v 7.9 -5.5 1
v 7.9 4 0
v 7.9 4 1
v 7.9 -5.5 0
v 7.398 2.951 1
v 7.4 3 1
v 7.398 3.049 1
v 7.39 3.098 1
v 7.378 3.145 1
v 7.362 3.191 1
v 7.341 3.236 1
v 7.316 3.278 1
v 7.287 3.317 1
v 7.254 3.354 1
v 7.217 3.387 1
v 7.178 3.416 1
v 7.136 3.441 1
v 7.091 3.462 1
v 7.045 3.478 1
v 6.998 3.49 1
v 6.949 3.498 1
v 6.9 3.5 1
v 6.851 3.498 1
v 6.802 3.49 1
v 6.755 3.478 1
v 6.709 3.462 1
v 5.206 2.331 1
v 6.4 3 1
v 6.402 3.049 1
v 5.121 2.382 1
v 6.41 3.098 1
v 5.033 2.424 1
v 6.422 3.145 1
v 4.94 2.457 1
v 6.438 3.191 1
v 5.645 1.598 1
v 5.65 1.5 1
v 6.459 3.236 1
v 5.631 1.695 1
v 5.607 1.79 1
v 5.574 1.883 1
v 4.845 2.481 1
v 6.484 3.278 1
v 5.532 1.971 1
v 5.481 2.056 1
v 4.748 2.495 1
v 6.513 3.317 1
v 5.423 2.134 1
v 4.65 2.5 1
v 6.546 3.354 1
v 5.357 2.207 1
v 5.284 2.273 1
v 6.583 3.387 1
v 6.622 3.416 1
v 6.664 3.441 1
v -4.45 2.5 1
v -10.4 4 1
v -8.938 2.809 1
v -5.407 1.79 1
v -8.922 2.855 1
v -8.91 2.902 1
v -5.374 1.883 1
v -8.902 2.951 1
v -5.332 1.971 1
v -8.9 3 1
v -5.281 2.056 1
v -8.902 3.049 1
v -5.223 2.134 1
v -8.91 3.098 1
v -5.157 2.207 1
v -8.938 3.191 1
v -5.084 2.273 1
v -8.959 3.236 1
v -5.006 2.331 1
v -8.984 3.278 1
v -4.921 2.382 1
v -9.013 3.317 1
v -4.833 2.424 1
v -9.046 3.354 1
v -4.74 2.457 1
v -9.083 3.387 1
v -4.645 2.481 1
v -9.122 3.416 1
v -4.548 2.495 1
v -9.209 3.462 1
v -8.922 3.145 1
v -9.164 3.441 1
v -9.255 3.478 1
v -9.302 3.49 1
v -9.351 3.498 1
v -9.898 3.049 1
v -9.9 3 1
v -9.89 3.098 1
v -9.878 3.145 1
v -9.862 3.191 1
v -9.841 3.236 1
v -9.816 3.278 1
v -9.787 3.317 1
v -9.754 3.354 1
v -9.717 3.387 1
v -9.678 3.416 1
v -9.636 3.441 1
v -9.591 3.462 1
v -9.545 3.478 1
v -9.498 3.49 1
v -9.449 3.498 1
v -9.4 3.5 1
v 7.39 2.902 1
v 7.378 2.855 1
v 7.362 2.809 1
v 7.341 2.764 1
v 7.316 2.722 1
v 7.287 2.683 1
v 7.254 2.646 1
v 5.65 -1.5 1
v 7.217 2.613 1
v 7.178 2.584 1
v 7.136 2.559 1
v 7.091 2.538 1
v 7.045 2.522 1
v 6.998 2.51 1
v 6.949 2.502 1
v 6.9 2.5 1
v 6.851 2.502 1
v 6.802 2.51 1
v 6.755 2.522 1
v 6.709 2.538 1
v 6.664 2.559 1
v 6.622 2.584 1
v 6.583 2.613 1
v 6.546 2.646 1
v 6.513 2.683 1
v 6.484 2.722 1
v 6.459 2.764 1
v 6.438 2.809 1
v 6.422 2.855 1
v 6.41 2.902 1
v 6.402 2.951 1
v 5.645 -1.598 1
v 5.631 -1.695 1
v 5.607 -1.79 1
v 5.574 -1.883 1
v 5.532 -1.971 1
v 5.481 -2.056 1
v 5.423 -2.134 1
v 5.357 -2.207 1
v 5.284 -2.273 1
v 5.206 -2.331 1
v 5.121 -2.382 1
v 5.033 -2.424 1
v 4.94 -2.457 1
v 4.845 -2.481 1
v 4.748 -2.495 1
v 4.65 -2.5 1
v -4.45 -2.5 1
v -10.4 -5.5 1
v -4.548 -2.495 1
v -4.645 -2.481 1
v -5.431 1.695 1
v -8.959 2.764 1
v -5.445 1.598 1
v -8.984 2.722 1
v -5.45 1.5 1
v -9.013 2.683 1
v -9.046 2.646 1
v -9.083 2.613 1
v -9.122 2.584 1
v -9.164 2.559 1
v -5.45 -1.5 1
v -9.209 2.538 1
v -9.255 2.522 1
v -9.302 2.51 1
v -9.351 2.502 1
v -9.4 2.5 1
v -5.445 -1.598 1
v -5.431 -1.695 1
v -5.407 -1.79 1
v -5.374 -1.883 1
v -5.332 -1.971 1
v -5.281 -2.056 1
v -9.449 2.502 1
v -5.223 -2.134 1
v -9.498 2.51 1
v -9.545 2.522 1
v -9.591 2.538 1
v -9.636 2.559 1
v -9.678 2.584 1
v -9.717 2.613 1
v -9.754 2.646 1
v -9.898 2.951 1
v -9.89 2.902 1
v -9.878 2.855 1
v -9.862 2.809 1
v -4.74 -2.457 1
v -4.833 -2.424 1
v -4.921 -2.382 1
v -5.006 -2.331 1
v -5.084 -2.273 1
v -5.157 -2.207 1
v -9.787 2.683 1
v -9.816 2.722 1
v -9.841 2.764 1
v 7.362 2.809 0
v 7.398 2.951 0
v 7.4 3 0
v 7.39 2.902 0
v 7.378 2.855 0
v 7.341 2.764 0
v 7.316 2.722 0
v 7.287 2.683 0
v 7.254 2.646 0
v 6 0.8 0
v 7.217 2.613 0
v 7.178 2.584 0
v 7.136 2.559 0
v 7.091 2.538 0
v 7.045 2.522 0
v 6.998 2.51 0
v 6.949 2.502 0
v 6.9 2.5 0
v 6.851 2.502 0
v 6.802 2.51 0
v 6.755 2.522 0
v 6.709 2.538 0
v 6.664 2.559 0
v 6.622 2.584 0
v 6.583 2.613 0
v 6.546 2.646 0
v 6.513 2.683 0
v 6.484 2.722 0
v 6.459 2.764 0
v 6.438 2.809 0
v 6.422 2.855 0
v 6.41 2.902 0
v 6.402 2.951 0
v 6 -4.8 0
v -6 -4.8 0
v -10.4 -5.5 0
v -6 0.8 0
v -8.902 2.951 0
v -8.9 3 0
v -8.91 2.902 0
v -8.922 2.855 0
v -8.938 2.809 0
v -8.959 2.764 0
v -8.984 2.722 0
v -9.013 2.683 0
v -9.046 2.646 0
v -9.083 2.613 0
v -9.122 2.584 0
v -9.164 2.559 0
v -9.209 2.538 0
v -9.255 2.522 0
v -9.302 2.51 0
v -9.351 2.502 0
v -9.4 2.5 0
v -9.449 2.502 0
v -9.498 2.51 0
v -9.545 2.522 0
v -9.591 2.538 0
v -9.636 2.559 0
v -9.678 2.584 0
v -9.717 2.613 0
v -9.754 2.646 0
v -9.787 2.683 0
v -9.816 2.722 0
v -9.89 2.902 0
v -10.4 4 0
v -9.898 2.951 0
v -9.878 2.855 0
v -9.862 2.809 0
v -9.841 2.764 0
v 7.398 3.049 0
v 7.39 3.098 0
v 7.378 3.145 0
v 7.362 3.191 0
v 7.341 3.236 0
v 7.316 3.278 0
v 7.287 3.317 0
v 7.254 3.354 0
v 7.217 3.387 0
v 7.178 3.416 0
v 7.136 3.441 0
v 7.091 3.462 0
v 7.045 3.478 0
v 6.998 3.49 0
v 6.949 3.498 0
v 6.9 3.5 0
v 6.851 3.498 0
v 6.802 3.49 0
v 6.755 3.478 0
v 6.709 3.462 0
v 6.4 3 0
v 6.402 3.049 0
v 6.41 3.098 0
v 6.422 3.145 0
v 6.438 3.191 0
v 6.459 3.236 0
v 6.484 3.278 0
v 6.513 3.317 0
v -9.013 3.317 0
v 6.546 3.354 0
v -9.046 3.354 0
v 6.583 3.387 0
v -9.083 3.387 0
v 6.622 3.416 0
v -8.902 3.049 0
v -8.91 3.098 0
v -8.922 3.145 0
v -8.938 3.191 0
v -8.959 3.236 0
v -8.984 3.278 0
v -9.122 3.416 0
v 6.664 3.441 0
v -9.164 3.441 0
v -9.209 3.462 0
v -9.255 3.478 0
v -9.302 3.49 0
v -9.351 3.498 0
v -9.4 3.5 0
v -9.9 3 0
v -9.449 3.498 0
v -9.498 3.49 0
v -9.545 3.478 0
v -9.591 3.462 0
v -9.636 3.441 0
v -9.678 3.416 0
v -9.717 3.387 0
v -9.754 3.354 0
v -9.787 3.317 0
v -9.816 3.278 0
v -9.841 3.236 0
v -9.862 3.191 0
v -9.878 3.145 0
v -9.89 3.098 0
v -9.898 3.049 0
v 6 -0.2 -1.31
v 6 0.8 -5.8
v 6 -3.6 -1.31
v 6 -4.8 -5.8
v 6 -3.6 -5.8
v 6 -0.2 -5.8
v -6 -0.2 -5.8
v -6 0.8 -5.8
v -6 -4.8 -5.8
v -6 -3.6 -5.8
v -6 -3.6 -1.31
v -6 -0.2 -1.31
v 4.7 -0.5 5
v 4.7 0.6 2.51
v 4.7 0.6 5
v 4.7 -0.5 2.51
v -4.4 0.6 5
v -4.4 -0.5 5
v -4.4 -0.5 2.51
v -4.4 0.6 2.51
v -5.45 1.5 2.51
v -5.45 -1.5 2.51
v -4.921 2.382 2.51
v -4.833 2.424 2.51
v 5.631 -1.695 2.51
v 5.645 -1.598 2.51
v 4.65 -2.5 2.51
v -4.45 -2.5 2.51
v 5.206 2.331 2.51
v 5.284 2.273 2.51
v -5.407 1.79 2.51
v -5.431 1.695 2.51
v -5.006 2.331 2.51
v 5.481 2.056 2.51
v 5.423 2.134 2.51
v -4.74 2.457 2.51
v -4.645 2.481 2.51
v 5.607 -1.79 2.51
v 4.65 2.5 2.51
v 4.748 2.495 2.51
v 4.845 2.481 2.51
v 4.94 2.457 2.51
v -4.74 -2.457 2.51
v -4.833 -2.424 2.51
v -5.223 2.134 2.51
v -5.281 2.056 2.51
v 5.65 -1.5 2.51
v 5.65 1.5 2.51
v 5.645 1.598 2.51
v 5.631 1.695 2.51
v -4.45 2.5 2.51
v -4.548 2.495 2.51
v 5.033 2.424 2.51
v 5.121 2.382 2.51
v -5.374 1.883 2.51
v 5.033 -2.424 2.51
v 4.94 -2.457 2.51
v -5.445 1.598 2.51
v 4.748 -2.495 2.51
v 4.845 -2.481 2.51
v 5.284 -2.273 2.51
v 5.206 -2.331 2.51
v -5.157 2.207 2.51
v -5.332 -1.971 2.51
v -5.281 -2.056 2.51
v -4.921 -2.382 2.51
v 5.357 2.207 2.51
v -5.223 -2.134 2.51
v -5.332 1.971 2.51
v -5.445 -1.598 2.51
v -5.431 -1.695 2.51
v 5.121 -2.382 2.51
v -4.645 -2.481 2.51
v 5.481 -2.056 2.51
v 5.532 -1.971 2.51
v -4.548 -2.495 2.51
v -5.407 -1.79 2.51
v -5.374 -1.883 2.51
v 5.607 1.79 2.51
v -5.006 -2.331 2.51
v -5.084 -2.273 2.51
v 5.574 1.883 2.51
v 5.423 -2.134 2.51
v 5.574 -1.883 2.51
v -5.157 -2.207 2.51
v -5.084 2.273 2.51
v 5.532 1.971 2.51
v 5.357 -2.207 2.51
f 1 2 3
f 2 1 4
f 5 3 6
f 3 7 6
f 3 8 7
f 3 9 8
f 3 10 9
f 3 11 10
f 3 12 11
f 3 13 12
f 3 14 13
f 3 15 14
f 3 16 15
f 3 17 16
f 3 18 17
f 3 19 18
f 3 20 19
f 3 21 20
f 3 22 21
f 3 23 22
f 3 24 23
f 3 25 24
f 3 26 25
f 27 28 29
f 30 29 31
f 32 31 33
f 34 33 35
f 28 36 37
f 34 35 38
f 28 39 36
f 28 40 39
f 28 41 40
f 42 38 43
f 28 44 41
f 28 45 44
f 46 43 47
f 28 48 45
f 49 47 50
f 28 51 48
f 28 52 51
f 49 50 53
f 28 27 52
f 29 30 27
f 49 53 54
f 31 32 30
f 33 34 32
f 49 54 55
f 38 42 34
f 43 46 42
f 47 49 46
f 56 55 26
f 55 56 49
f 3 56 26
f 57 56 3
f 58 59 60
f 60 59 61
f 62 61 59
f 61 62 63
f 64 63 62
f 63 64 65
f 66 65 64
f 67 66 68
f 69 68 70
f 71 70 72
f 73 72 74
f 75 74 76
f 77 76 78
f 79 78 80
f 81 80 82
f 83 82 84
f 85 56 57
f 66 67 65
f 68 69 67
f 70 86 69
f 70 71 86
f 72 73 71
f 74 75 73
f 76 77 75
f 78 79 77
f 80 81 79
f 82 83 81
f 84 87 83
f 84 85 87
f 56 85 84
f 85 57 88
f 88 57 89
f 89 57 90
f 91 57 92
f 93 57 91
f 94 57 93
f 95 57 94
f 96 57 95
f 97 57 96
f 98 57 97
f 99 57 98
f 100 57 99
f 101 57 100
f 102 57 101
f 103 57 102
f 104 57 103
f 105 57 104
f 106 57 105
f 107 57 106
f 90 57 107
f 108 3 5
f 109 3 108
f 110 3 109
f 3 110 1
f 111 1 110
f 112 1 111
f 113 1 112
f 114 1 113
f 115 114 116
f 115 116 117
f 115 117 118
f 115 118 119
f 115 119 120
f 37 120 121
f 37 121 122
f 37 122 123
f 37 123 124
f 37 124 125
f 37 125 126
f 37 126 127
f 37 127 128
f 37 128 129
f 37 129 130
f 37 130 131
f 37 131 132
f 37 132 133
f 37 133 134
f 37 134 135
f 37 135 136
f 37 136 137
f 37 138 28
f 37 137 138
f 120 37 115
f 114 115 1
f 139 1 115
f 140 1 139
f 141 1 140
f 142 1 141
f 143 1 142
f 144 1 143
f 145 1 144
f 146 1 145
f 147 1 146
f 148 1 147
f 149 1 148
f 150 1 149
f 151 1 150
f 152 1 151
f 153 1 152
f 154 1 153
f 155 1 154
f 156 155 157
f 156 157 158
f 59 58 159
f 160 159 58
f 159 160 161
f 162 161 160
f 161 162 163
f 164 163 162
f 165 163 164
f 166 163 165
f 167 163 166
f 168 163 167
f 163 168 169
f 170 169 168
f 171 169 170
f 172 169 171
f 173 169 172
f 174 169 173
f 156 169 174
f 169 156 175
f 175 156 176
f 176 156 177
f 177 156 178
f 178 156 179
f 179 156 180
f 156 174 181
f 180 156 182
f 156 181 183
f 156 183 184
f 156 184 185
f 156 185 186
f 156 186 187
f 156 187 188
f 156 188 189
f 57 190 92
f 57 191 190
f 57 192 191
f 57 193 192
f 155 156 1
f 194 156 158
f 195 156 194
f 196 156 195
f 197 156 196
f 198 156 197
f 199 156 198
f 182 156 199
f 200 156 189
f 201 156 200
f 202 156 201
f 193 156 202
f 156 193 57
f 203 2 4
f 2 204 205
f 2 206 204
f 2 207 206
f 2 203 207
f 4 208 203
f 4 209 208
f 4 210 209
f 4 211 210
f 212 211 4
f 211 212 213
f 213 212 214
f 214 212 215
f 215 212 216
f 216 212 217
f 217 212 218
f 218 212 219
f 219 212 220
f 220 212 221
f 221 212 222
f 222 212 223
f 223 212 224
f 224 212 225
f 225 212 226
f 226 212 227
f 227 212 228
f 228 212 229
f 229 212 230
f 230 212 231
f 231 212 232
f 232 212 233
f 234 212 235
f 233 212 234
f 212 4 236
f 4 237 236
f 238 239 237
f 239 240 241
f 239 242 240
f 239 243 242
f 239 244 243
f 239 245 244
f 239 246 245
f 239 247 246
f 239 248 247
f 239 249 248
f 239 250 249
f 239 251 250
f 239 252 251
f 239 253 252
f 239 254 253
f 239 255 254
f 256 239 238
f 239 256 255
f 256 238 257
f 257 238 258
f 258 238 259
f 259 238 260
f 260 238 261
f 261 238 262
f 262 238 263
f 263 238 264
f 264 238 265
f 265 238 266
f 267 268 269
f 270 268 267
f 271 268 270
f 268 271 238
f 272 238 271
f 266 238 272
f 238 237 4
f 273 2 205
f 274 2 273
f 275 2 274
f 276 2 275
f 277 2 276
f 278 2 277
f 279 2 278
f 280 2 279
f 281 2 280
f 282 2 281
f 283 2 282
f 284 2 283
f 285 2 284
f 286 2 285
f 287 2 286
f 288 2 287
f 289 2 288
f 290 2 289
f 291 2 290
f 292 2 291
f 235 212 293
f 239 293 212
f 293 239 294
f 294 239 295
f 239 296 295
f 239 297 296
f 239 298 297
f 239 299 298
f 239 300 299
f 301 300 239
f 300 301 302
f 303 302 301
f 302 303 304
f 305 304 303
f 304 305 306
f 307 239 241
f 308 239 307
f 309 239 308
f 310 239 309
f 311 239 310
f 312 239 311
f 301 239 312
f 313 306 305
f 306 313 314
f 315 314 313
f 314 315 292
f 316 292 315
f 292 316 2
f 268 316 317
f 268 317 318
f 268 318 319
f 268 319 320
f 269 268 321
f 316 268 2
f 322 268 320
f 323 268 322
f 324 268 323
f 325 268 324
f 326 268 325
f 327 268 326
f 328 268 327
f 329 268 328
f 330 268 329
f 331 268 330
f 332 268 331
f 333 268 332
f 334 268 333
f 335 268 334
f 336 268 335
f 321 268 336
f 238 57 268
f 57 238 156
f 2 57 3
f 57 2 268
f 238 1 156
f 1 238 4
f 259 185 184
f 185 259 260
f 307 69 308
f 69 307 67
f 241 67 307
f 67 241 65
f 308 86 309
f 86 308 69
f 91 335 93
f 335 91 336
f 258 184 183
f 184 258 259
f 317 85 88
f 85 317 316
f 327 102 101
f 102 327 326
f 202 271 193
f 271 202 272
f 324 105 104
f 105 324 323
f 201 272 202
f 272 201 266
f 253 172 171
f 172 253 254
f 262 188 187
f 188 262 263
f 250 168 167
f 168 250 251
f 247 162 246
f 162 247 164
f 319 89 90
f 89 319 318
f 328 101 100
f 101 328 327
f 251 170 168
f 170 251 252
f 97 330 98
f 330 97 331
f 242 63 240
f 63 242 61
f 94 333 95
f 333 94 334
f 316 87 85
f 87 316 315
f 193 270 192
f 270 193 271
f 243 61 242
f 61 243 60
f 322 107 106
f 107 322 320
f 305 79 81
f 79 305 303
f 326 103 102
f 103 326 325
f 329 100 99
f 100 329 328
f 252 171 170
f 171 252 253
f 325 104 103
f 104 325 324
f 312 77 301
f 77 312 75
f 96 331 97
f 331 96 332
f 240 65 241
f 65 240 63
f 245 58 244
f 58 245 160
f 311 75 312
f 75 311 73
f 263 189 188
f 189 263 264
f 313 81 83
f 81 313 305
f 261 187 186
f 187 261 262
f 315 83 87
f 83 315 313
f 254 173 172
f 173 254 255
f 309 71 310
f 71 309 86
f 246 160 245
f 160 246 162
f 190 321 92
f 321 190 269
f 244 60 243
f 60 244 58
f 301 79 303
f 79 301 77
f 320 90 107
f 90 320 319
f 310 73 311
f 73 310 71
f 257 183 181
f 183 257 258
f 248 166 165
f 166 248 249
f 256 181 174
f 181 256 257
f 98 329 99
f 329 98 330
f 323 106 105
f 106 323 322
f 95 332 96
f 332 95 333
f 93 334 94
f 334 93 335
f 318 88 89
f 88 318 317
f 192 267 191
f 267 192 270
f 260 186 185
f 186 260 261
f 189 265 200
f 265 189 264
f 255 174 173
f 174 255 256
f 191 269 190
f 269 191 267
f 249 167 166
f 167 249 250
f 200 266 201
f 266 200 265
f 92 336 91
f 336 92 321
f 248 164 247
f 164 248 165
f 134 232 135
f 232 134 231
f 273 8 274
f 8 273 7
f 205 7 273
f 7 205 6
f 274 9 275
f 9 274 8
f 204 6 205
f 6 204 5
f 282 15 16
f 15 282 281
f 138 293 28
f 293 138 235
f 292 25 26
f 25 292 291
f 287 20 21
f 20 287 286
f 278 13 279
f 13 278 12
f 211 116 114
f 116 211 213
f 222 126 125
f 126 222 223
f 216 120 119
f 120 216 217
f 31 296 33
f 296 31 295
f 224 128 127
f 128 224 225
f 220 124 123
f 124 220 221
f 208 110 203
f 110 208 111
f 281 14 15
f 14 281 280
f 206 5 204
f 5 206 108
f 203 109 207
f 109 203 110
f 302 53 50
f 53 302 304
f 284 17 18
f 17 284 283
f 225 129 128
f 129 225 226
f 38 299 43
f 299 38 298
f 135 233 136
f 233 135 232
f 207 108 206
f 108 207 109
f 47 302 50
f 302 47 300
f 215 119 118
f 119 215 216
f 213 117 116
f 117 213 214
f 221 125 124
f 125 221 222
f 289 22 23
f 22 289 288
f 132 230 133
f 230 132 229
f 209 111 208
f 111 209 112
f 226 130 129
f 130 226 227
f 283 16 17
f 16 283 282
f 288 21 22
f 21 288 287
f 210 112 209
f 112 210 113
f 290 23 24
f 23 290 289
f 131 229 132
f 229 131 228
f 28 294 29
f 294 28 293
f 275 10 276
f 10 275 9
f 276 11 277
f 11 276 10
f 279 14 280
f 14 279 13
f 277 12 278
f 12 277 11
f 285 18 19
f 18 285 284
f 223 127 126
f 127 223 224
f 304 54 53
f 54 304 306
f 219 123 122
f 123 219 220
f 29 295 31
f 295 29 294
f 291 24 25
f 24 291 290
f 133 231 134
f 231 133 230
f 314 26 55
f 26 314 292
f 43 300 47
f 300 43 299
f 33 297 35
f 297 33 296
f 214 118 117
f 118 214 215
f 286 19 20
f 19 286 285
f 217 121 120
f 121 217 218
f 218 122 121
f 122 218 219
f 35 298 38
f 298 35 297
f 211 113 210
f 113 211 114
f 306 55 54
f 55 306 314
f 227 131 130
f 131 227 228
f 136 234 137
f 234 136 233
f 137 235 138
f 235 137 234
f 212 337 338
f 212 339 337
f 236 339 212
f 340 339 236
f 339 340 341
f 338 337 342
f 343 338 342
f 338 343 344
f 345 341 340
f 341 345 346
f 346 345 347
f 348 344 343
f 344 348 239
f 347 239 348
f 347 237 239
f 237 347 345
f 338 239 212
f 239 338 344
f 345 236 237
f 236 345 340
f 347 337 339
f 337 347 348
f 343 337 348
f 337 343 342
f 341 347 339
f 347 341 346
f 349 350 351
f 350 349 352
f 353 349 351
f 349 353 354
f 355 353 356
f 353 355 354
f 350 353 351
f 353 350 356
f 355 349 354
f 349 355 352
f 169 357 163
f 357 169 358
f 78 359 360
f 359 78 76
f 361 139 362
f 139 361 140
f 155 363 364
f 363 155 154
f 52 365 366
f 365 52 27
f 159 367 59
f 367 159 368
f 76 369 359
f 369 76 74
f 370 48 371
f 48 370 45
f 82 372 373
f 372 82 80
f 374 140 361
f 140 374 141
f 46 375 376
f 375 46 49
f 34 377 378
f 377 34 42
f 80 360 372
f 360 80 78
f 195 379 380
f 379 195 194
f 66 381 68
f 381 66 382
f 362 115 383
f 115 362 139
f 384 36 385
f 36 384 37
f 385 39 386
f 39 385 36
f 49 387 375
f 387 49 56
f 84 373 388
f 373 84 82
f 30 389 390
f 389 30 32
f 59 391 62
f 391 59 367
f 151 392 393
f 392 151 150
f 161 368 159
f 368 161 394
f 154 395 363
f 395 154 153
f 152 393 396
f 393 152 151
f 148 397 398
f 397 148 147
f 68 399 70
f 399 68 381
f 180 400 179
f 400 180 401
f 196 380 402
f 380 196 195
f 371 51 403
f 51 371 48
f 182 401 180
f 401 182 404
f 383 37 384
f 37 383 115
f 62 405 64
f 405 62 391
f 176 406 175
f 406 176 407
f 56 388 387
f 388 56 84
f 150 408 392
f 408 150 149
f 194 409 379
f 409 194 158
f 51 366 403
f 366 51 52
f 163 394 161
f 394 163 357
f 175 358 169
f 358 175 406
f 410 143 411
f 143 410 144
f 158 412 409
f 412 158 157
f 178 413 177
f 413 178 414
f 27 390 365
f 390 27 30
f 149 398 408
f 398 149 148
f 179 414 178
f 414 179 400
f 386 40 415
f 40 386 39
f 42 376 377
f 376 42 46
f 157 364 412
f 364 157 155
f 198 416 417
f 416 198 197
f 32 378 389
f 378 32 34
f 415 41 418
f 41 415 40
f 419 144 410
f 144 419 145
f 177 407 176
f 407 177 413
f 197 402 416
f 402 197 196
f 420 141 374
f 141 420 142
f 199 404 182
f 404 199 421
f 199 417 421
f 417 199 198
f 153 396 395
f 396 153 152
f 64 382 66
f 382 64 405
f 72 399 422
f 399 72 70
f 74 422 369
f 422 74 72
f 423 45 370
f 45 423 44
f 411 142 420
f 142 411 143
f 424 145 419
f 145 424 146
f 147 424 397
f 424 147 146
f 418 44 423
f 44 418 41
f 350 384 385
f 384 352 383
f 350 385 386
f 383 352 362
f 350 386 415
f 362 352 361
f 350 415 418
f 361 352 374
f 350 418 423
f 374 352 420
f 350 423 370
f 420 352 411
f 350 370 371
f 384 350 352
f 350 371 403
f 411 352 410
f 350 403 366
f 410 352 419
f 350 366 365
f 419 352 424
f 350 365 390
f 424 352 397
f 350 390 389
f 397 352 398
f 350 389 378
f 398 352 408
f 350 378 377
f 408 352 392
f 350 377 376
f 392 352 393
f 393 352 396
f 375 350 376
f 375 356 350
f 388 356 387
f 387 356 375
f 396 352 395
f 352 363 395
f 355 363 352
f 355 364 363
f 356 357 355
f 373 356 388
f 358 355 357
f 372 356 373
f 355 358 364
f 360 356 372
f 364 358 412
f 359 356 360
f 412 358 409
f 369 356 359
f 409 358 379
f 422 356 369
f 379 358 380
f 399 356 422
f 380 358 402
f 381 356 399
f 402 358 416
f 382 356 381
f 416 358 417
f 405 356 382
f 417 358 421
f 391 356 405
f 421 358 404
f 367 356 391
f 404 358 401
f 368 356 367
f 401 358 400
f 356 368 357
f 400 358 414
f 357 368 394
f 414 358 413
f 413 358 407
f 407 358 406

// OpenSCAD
// file: roundedrect.scad
$fn=64;


// size - [x,y,z]
// radius - radius of corners
// DEPRECATED!!
module roundedRect(size, radius, center=false)
{
    x = size[0];
    y = size[1];
    z = size[2];
    translate([0,0,z/2])
    _cube_vertex_smooth2d([x,y,z],radius);
}


// size - [x,y,z]
// radius - radius of corners
module _cube_vertex_smooth3d(size,radius=1)
{
    minkowski() {
        cube([size[0]-radius*2,
              size[1]-radius*2,
              size[2]-radius*2],
             center=true);
        sphere(r=radius);
    }
}

module cube_vertex_smooth3d(size,radius=1,center=false)
{
    if (center) {
        _cube_vertex_smooth3d(size,radius);
    } else {
        translate([size[0]/2,size[1]/2,size[2]/2])
        _cube_vertex_smooth3d(size,radius);
    }
}

module _cube_vertex_smooth2d(size,radius=1)
{
    minkowski() {
        cube([size[0]-radius*2,
              size[1]-radius*2,
              size[2]],
             center=true);
        cylinder(h=0.01,r=radius);
    }
}

// size - [x,y,z]
// radius - radius of corners
module cube_vertex_smooth2d(size,radius=1,center=false)
{
    if (center) {
        _cube_vertex_smooth2d(size,radius);
    } else {
        translate([size[0]/2,size[1]/2,size[2]/2])
        _cube_vertex_smooth2d(size,radius);
    }
}

//translate([10,10,0])
color("blue")
cube([10,10,10],center=true);
color("blue")
cube([10,10,10]);


translate([10,0,0]) {
    color("red")
    cube_vertex_smooth2d([10,10,10],3,center=true);
    color("red")
    cube_vertex_smooth2d([10,10,10],3,center=false);
}

translate([20,0,0]) {
    color("yellow")
    cube_vertex_smooth3d([10,10,10],3,center=true);
    color("yellow")
    cube_vertex_smooth3d([10,10,10],3,center=false);
}

translate([30,0,0]) {
    color("purple")
    roundedRect([10,10,10],3,center=true);
}

//translate([10,0,0]) {
//    cube_vertex_smooth2d([10,10,10],2);
//}
//
//translate([20,0,0]) {
//    cube_vertex_smooth3d([10,10,10],2);
//}
// main file
/*
 * Copyright (C) 2015 Richard Hughes <richard@hughsie.com>
 *
 * Licensed under the CERN Open Hardware Licence v1.1
 *
 * Through this CERN Open Hardware Licence ("CERN OHL") version 1.1, the
 * Organization wishes to disseminate its hardware designs (as published
 * on http://www.ohwr.org/) as widely as possible, and generally to
 * foster collaboration among public research hardware designers.  The
 * CERN OHL is copyright of CERN. Anyone is welcome to use the CERN OHL,
 * in unmodified form only, for the distribution of his own Open Hardware
 * designs. Any other right is reserved.  
 */

use <roundedrect.scad>

$fn=64;

module ocean_optics_spark()
{
    size_x = 18.3;
    size_y = 9.5;



    transparency=1.0;
    translate([-size_x/2-1.25,-size_y/2-0.75,0]) {
        // pcb
        difference() {
            color([0,0.3,0,transparency])
            cube([size_x,size_y,1.0]);

            // holes in PCB
            translate([1,9.5-1,-1])
            cylinder(d=1, h=3);
            translate([size_x-1,9.5-1,-1])
            cylinder(d=1, h=3);
        }

        // sensor
        translate([6, 5, 1])
        color([0,0,0,transparency])
        cube([9.1,1.1,4.0]);

        // glue
        translate([10.5, 5.5, 1])
        color([0.4,0.4,0.4,transparency])
        roundedRect([11.1,5,1.5],1);

        // label
        translate([1,1,0.55])
        color([0,0,0])
        text("#00057",size=1.5);

        // socket
        difference() {
            translate([4.4, 0.7, -5.8])
            color([0.2,0.2,0.2,transparency])
            cube([12,5.6,5.8]);

            translate([4.4-1, 0.7+1.2, -5.8-0.01])
            color([0.2,0.2,0.2,transparency])
            cube([14,3.4,4.5]);
        }
    }
}

ocean_optics_spark();
